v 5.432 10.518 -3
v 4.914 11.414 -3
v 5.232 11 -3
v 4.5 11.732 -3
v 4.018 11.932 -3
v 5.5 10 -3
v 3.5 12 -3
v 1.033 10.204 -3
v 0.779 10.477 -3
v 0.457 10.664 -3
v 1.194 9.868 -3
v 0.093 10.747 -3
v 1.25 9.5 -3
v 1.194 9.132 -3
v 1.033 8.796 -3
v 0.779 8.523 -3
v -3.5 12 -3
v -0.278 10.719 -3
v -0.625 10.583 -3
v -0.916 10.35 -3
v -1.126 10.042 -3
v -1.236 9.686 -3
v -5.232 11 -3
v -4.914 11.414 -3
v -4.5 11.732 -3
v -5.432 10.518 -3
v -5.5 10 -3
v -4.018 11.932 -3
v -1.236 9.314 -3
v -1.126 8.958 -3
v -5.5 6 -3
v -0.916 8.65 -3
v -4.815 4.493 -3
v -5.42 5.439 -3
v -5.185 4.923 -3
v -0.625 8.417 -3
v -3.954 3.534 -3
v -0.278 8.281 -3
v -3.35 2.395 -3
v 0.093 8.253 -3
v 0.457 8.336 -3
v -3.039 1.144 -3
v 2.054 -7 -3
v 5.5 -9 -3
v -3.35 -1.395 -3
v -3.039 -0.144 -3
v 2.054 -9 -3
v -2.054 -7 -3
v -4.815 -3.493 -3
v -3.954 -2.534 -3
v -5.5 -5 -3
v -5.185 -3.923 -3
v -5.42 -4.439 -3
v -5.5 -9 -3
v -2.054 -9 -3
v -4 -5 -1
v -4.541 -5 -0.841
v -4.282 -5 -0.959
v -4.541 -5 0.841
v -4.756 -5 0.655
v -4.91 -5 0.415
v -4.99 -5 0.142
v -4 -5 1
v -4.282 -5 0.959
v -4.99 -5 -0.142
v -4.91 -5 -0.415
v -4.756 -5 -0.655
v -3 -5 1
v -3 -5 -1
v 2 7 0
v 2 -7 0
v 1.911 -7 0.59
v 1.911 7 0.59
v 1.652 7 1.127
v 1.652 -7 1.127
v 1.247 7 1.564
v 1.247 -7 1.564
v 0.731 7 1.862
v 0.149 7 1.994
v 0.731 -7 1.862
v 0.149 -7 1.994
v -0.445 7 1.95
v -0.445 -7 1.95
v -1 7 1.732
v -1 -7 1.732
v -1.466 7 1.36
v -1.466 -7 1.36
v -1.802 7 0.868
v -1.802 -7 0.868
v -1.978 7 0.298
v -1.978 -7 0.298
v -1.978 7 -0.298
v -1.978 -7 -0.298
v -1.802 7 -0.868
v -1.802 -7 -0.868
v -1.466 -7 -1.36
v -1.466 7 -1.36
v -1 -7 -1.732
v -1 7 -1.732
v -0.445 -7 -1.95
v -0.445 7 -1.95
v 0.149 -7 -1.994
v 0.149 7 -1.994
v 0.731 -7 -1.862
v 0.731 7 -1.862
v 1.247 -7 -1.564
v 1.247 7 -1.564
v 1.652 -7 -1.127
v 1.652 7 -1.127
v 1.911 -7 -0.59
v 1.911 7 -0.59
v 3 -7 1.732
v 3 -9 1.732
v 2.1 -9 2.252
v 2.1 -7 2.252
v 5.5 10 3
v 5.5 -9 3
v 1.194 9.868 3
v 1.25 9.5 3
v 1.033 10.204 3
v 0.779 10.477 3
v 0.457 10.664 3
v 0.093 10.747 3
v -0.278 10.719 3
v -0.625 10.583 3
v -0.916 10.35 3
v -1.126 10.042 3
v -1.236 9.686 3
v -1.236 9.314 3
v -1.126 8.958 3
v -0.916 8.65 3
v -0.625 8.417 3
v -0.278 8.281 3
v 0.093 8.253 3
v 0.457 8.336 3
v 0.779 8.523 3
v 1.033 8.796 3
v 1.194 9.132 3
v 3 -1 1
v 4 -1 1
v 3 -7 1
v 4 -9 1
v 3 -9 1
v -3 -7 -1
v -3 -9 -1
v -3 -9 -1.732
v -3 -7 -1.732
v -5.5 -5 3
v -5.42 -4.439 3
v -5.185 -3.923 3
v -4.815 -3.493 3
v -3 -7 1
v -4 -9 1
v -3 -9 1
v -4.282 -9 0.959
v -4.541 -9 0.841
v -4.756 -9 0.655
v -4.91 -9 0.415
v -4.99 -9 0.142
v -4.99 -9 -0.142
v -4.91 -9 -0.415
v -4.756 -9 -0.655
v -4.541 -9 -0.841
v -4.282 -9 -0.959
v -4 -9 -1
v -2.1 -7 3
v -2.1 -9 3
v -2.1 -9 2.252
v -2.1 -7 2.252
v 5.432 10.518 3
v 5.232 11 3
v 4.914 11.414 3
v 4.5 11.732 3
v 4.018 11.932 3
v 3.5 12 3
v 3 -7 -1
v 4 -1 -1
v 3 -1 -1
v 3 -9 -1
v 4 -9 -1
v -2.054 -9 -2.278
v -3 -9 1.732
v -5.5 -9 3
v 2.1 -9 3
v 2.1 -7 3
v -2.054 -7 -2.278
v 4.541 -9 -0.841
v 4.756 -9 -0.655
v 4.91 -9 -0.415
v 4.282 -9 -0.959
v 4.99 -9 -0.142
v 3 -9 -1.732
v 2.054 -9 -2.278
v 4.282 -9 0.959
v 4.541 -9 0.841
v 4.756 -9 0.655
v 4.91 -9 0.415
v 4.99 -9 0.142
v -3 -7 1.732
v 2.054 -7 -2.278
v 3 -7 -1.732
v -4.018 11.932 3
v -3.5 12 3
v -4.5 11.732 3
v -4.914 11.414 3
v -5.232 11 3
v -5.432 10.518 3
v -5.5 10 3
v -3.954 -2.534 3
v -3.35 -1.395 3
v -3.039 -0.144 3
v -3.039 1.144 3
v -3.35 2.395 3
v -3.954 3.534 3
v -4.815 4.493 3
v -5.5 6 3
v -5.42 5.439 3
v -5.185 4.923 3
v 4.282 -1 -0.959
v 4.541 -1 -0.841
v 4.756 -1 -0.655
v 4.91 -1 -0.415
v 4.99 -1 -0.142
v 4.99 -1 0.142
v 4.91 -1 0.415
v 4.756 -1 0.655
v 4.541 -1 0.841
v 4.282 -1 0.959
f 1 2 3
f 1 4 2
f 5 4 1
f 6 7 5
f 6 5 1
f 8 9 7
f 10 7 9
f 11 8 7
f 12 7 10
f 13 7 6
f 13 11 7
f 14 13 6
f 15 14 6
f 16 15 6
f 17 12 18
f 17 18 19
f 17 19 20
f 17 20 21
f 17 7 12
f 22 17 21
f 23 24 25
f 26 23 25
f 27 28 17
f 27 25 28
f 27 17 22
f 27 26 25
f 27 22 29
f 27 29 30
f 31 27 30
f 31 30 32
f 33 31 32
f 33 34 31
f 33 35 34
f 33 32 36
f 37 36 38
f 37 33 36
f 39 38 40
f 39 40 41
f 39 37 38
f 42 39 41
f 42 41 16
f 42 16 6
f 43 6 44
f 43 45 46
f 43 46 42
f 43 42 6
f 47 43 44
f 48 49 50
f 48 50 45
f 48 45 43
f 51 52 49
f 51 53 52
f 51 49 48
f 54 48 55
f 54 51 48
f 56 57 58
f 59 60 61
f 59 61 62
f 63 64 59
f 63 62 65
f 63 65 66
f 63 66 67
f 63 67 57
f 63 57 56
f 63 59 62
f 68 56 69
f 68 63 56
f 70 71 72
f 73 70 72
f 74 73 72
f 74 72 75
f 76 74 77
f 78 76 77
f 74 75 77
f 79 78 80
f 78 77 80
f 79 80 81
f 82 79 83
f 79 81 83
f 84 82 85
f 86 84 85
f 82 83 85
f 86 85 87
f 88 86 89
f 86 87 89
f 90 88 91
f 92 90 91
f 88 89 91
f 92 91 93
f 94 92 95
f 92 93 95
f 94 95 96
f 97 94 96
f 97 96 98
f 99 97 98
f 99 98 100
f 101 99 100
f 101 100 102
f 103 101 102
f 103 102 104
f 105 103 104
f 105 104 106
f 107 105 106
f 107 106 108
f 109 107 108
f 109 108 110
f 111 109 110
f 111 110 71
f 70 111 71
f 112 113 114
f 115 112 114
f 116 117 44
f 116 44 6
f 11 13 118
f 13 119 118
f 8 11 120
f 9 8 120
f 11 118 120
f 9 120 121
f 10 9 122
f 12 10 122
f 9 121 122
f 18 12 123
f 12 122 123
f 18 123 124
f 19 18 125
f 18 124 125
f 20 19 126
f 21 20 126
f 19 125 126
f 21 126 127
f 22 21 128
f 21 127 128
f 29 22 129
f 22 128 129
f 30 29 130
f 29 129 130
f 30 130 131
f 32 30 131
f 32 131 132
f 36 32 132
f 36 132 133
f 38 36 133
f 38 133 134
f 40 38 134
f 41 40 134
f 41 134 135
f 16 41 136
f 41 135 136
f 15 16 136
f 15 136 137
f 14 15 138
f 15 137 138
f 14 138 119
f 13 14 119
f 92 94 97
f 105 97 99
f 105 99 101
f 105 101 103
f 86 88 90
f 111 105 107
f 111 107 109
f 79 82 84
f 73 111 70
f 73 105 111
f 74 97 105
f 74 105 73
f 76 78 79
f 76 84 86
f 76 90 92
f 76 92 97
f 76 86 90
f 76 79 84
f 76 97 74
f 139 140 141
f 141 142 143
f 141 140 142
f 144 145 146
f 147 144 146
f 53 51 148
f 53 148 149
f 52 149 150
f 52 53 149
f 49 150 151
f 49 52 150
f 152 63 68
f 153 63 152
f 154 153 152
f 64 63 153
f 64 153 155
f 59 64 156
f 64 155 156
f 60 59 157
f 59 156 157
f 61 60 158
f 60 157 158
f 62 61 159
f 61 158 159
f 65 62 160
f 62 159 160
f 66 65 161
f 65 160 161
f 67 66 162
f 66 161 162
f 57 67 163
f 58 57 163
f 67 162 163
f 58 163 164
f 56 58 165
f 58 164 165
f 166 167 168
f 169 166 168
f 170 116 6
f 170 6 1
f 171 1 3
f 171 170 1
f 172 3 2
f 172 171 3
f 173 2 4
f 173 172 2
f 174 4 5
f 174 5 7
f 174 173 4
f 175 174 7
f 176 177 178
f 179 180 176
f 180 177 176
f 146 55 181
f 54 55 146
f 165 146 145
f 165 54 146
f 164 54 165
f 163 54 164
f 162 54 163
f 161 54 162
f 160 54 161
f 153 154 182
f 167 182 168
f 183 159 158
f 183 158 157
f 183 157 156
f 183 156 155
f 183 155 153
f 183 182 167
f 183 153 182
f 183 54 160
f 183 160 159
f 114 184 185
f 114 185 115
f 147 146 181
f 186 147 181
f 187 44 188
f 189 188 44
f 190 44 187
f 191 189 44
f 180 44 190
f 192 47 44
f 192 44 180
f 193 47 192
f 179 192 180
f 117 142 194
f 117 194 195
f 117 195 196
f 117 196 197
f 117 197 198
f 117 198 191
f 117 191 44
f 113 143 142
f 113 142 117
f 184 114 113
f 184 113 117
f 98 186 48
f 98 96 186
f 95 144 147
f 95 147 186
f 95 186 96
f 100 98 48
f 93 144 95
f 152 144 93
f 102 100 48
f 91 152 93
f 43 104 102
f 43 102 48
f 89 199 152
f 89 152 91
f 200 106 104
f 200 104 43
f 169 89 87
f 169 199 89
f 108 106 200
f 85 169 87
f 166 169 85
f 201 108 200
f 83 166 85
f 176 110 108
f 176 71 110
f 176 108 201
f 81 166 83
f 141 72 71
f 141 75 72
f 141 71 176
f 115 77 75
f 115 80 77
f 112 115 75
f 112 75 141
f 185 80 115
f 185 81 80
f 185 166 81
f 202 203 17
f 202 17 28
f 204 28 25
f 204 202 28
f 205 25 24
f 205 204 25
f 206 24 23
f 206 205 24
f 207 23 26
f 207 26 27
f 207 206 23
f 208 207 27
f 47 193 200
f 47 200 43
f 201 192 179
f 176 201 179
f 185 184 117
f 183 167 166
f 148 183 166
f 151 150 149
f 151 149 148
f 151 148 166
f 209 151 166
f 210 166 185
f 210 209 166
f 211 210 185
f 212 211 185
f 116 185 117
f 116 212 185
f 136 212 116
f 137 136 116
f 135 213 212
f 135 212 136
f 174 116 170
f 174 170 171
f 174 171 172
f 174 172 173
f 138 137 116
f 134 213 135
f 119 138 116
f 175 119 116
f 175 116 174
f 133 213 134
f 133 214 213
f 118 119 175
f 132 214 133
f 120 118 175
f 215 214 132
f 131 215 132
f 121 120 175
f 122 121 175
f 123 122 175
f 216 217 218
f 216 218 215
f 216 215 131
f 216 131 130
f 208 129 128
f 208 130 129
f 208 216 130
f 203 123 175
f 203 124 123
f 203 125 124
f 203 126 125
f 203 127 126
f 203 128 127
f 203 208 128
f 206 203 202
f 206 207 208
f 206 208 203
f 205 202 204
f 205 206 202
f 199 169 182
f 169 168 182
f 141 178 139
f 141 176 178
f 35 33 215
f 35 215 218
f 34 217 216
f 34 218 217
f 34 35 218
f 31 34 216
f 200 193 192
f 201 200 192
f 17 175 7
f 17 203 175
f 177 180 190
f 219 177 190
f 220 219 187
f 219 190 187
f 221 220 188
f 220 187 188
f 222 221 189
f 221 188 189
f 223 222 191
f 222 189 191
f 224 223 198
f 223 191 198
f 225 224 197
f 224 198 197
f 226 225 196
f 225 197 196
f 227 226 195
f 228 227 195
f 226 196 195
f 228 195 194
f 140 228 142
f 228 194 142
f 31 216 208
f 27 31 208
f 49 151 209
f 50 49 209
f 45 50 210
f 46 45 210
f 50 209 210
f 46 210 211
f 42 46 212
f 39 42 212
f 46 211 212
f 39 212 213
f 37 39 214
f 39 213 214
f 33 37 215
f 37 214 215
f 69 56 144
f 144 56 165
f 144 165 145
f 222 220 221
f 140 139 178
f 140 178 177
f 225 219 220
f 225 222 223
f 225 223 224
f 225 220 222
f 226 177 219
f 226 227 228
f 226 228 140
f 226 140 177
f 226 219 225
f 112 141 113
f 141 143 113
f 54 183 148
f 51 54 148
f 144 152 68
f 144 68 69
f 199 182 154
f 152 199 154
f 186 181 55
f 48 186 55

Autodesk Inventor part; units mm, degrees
ref_plane "plane_support" through (-5.5, -8, -3) normal (0, -1, 0) x (1, 0, 0)
ref_plane "YZ Plane" through (0, 0, 0) normal (1, 0, 0) x (0, 1, 0)
ref_plane "XZ Plane" through (0, 0, 0) normal (0, 1, 0) x (-1, 0, 0)
sketch "Sketch14" plane through (0, 0, 0) normal (1, 0, 0) x (0, 1, 0)
  line L0 (-13.2, 0) -> (16.2, 0) projected
  line L1 (0, -4.2) -> (0, 4.2) projected
  line L2 (9, -3) -> (-9, -3)
  line L3 (-9, -3) -> (-9, 3)
  line L4 (-9, 3) -> (9, 3)
  line L5 (9, 3) -> (9, -3) construction
  line L6 (9, -3) -> (-9, 3) construction
  line L7 (-9, -3) -> (9, 3) construction
  line L8 (5.5, 3) -> (5.5, -3) construction
  line L9 (-6.5, 3) -> (-6.5, -3) construction
  arc A0 (9, -3) -> (9, 3) centre (9, 0) ccw
  circle A1 centre (9, 0) radius 1.25
  circle A2 centre (9, 0) radius 3 construction
  line L10 (6, 3) -> (6, -3) construction
  line L11 (12, -3) -> (9, -3)
  line L12 (9, -3) -> (9, 3)
  line L13 (9, 3) -> (12, 3)
  line L14 (12, 3) -> (12, -3)
  line L15 (12, -3) -> (9, 3) construction
  line L16 (9, -3) -> (12, 3) construction
  point P0 (0, 0)
  point P1 (0, 0)
  point P2 (10.5, 0)
  dimension "d72" = 6
  dimension "d73" = 12
  dimension "d74" = 2.5
  dimension "d75" = 2.5
  dimension "d76" = 0.5
extrude "ext_main" add sketch "Sketch14" along normal mid plane 11
sketch "sk_channel_nut" plane through (-5.5, -9, -3) normal (0, -1, 0) x (1, 0, 0)
  line L0 (-2.2, 3) -> (13.2, 3) projected
  line L1 (5.5, -1.8497) -> (5.5, 7.8497) projected
  circle A0 centre (5.5, 3) radius 2
  line L2 (5.5, 6.4641) -> (2.5, 4.7321)
  line L3 (2.5, 4.7321) -> (2.5, 1.2679)
  line L4 (2.5, 1.2679) -> (5.5, -0.4641)
  line L5 (5.5, -0.4641) -> (8.5, 1.2679)
  line L6 (8.5, 1.2679) -> (8.5, 4.7321)
  line L7 (8.5, 4.7321) -> (5.5, 6.4641)
  circle A1 centre (1.5, 3) radius 1
  circle A2 centre (9.5, 3) radius 1
  line L8 (1.5, 4) -> (2.5, 4)
  line L9 (1.5, 2) -> (2.5, 2)
  line L10 (9.5, 4) -> (8.5, 4)
  line L11 (9.5, 2) -> (8.5, 2)
  line L12 (11, 0) -> (0, 0) projected
  line L13 (11, 6) -> (0, 6) projected
  line L14 (0, 0) -> (0, 6) projected
  line L15 (3.4, 6) -> (3.4, 5.2517)
  line L16 (3.4456, 0.722) -> (3.4456, 0)
  line L17 (7.5544, 0.722) -> (7.5544, 0)
  line L18 (7.6, 6) -> (7.6, 5.2517)
  point P0 (5.5, 3)
  point P1 (2.5, 3)
  dimension "d85" = 4
  dimension "d86" = 120
  dimension "d87" = 6
  dimension "d88" = 2
  dimension "d95" = 4.2
extrude "ext_cut_bottomscrews" cut sketch "sk_channel_nut" against normal blind 8 contours A2 L0 | A2 L11 L6 | L6 L10 A2 | L0 A2
extrude "ext_cut_bottom_nut" cut sketch "sk_channel_nut" against normal blind 2 contours L3 L2 L13 L1 A0 L0 | L0 A0 L1 L12 L4 L3 | L16 L4 L12 | L13 L2 L15 | A0 L1 L0 | L0 L1 A0 | L12 L1 L4 | L2 L1 L13 | L1 A0 L0 | L0 A0 L1 | L1 L13 L7 L6 L0 A0 | A0 L0 L6 L5 L12 L1 | L1 L12 L5 | L7 L13 L1 | L5 L17 L12 | L13 L18 L7
sketch "Sketch21" plane through (-5.5, 12, 3) normal (0, 0, 1) x (1, 0, 0)
  line L0 (11, 0) -> (11, -21) projected
  line L1 (0, 0) -> (11, 0) projected
  line L2 (0, -21) -> (0, 0) projected
  line L3 (3.4, -19) -> (7.6, -19) projected
  line L4 (5.5, 0) -> (5.5, -2.5815) construction
  arc A0 (2, 0) -> (0, -2) centre (2, -2) ccw
  arc A1 (11, -2) -> (9, 0) centre (9, -2) ccw
  circle A2 centre (5.5, -2.5) radius 1.25
  point P0 (5.5, -12)
  point P1 (5.5, -1.25)
  dimension "d106" = 2.5
  dimension "d105" = 2
  dimension "d107" = 1.25
extrude "ext_cut_fronthole" cut sketch "Sketch21" against normal through all
extrude "ext_cut_channel" cut sketch "sk_channel_nut" against normal blind 16 contours A0 L1 L0 | L0 L1 A0 | L1 A0 L0 | L0 A0 L1
extrude "ext_cut_shortscrew" cut sketch "sk_channel_nut" against normal blind 4 contours A1 L0 | L0 A1 | A1 L8 L3 | L3 L9 A1
sketch "Sketch22" plane through (-2.1, -7, 3) normal (0, 0, 1) x (1, 0, 0)
  line L0 (-3.4, -2) -> (-3.4, 17) projected
  line L1 (0, -2) -> (-3.4, -2) projected
  line L2 (-3.4, 12) -> (-3.4, 3)
  arc A0 (-3.4, 3) -> (-3.4, 12) centre (-6.2, 7.5) ccw
  line L3 (-3.4, 7.5) -> (-0.9, 7.5) construction
  point P0 (2.1, 7)
  dimension "d112" = 5
  dimension "d113" = 9
  dimension "d119" = 2.5
extrude "ext_cut_cutway" cut sketch "Sketch22" against normal through all
fillet "Fillet1" radius 2 2 edges at (-5.5, 5, 0) (-5.5, -4, 0)
sketch "Sketch19" plane through (-5.5, -8, -3) normal (0, -1, 0) x (1, 0, 0)
  line L0 (3.4, 6) -> (7.6, 6) projected
  line L1 (3.4, 5.2517) -> (3.4, 6) projected
  line L2 (2.5, 4.7321) -> (3.4, 5.2517) projected
  line L3 (2.5, 1.2679) -> (2.5, 2) projected
  line L4 (3.4456, 0.722) -> (2.5, 1.2679) projected
  line L5 (3.4456, 0) -> (3.4456, 0.722) projected
  line L6 (7.5544, 0) -> (3.4456, 0) projected
  line L7 (7.5544, 0.722) -> (7.5544, 0) projected
  line L8 (8.5, 1.2679) -> (7.5544, 0.722) projected
  line L9 (8.5, 2) -> (8.5, 1.2679) projected
  line L10 (8.5, 4) -> (8.5, 2) projected
  line L11 (8.5, 4.7321) -> (8.5, 4) projected
  line L12 (7.6, 5.2517) -> (8.5, 4.7321) projected
  line L13 (7.6, 6) -> (7.6, 5.2517) projected
  circle A0 centre (5.5, 3) radius 2 projected
  line L14 (3.8, 5.675) -> (7.275, 5.675) construction
  line L15 (7.275, 5.675) -> (7.275, 5.064)
  line L16 (7.275, 5.064) -> (8.175, 4.5444)
  line L17 (8.175, 4.5444) -> (8.175, 4)
  line L18 (8.175, 4) -> (8.175, 2)
  line L19 (8.175, 2) -> (8.175, 1.4556)
  line L20 (8.175, 1.4556) -> (7.2294, 0.9097)
  line L21 (7.2294, 0.9097) -> (7.2294, 0.325)
  line L22 (7.2294, 0.325) -> (3.7706, 0.325) construction
  line L23 (3.7706, 0.325) -> (3.7706, 0.9097)
  line L24 (3.7706, 0.9097) -> (2.9, 1.4123)
  line L25 (2.9, 1.4123) -> (2.9, 2)
  line L26 (2.9, 2) -> (2.9, 4)
  line L27 (2.9, 4) -> (2.9, 4.5011)
  line L28 (2.9, 4.5011) -> (3.8, 5.0207)
  line L29 (3.8, 5.0207) -> (3.8, 5.675)
  line L30 (3.8, 5.675) -> (7.275, 5.675)
  line L31 (7.275, 5.675) -> (7.275, 6)
  line L32 (7.275, 6) -> (3.8, 6)
  line L33 (3.8, 6) -> (3.8, 5.675)
  line L34 (3.7706, 0.325) -> (7.2294, 0.325)
  line L35 (7.2294, 0.325) -> (7.2294, 0)
  line L36 (7.2294, 0) -> (3.7706, 0)
  line L37 (3.7706, 0) -> (3.7706, 0.325)
  line L38 (2.5, 2) -> (2.5, 4) projected
  line L39 (2.5, 4) -> (2.5, 4.7321) projected
  point P0 (5.5, 3)
  dimension "d97" = 0.4
equation "\"d73\" = linact_rod_effective_length"
equation "\"d74\" = nut_m3_thickness_max"
equation "\"d75\" = screw_m2_bore_loose"
equation "\"d87\" = nut_m3_width_acrossflats"
equation "\"d88\" = screw_m2_bore_selfthreading"
equation "\"d95\" = 0.7 * nut_m3_width_acrossflats"
equation "\"d93\" = 0.8 * nut_m3_thickness_max"
equation "\"d106\" = screw_m2_bore_loose"
equation "\"d107\" = 0.5 * screw_m2_bore_loose"
equation "\"d97\" = print_support_z_clearance"
equation "\"d96\" = print_support_xy_clearance"
equation "\"linact_rod_effective_length\" = 12"
equation "\"nut_m3_thickness_max\" = 2.5"
equation "\"screw_m2_bore_loose\" = 2.5"
equation "\"nut_m3_width_acrossflats\" = 6"
equation "\"screw_m2_bore_selfthreading\" = 2"
equation "\"print_support_z_clearance\" = 0.4"
equation "\"print_support_xy_clearance\" = 1"
properties part number "empty"
